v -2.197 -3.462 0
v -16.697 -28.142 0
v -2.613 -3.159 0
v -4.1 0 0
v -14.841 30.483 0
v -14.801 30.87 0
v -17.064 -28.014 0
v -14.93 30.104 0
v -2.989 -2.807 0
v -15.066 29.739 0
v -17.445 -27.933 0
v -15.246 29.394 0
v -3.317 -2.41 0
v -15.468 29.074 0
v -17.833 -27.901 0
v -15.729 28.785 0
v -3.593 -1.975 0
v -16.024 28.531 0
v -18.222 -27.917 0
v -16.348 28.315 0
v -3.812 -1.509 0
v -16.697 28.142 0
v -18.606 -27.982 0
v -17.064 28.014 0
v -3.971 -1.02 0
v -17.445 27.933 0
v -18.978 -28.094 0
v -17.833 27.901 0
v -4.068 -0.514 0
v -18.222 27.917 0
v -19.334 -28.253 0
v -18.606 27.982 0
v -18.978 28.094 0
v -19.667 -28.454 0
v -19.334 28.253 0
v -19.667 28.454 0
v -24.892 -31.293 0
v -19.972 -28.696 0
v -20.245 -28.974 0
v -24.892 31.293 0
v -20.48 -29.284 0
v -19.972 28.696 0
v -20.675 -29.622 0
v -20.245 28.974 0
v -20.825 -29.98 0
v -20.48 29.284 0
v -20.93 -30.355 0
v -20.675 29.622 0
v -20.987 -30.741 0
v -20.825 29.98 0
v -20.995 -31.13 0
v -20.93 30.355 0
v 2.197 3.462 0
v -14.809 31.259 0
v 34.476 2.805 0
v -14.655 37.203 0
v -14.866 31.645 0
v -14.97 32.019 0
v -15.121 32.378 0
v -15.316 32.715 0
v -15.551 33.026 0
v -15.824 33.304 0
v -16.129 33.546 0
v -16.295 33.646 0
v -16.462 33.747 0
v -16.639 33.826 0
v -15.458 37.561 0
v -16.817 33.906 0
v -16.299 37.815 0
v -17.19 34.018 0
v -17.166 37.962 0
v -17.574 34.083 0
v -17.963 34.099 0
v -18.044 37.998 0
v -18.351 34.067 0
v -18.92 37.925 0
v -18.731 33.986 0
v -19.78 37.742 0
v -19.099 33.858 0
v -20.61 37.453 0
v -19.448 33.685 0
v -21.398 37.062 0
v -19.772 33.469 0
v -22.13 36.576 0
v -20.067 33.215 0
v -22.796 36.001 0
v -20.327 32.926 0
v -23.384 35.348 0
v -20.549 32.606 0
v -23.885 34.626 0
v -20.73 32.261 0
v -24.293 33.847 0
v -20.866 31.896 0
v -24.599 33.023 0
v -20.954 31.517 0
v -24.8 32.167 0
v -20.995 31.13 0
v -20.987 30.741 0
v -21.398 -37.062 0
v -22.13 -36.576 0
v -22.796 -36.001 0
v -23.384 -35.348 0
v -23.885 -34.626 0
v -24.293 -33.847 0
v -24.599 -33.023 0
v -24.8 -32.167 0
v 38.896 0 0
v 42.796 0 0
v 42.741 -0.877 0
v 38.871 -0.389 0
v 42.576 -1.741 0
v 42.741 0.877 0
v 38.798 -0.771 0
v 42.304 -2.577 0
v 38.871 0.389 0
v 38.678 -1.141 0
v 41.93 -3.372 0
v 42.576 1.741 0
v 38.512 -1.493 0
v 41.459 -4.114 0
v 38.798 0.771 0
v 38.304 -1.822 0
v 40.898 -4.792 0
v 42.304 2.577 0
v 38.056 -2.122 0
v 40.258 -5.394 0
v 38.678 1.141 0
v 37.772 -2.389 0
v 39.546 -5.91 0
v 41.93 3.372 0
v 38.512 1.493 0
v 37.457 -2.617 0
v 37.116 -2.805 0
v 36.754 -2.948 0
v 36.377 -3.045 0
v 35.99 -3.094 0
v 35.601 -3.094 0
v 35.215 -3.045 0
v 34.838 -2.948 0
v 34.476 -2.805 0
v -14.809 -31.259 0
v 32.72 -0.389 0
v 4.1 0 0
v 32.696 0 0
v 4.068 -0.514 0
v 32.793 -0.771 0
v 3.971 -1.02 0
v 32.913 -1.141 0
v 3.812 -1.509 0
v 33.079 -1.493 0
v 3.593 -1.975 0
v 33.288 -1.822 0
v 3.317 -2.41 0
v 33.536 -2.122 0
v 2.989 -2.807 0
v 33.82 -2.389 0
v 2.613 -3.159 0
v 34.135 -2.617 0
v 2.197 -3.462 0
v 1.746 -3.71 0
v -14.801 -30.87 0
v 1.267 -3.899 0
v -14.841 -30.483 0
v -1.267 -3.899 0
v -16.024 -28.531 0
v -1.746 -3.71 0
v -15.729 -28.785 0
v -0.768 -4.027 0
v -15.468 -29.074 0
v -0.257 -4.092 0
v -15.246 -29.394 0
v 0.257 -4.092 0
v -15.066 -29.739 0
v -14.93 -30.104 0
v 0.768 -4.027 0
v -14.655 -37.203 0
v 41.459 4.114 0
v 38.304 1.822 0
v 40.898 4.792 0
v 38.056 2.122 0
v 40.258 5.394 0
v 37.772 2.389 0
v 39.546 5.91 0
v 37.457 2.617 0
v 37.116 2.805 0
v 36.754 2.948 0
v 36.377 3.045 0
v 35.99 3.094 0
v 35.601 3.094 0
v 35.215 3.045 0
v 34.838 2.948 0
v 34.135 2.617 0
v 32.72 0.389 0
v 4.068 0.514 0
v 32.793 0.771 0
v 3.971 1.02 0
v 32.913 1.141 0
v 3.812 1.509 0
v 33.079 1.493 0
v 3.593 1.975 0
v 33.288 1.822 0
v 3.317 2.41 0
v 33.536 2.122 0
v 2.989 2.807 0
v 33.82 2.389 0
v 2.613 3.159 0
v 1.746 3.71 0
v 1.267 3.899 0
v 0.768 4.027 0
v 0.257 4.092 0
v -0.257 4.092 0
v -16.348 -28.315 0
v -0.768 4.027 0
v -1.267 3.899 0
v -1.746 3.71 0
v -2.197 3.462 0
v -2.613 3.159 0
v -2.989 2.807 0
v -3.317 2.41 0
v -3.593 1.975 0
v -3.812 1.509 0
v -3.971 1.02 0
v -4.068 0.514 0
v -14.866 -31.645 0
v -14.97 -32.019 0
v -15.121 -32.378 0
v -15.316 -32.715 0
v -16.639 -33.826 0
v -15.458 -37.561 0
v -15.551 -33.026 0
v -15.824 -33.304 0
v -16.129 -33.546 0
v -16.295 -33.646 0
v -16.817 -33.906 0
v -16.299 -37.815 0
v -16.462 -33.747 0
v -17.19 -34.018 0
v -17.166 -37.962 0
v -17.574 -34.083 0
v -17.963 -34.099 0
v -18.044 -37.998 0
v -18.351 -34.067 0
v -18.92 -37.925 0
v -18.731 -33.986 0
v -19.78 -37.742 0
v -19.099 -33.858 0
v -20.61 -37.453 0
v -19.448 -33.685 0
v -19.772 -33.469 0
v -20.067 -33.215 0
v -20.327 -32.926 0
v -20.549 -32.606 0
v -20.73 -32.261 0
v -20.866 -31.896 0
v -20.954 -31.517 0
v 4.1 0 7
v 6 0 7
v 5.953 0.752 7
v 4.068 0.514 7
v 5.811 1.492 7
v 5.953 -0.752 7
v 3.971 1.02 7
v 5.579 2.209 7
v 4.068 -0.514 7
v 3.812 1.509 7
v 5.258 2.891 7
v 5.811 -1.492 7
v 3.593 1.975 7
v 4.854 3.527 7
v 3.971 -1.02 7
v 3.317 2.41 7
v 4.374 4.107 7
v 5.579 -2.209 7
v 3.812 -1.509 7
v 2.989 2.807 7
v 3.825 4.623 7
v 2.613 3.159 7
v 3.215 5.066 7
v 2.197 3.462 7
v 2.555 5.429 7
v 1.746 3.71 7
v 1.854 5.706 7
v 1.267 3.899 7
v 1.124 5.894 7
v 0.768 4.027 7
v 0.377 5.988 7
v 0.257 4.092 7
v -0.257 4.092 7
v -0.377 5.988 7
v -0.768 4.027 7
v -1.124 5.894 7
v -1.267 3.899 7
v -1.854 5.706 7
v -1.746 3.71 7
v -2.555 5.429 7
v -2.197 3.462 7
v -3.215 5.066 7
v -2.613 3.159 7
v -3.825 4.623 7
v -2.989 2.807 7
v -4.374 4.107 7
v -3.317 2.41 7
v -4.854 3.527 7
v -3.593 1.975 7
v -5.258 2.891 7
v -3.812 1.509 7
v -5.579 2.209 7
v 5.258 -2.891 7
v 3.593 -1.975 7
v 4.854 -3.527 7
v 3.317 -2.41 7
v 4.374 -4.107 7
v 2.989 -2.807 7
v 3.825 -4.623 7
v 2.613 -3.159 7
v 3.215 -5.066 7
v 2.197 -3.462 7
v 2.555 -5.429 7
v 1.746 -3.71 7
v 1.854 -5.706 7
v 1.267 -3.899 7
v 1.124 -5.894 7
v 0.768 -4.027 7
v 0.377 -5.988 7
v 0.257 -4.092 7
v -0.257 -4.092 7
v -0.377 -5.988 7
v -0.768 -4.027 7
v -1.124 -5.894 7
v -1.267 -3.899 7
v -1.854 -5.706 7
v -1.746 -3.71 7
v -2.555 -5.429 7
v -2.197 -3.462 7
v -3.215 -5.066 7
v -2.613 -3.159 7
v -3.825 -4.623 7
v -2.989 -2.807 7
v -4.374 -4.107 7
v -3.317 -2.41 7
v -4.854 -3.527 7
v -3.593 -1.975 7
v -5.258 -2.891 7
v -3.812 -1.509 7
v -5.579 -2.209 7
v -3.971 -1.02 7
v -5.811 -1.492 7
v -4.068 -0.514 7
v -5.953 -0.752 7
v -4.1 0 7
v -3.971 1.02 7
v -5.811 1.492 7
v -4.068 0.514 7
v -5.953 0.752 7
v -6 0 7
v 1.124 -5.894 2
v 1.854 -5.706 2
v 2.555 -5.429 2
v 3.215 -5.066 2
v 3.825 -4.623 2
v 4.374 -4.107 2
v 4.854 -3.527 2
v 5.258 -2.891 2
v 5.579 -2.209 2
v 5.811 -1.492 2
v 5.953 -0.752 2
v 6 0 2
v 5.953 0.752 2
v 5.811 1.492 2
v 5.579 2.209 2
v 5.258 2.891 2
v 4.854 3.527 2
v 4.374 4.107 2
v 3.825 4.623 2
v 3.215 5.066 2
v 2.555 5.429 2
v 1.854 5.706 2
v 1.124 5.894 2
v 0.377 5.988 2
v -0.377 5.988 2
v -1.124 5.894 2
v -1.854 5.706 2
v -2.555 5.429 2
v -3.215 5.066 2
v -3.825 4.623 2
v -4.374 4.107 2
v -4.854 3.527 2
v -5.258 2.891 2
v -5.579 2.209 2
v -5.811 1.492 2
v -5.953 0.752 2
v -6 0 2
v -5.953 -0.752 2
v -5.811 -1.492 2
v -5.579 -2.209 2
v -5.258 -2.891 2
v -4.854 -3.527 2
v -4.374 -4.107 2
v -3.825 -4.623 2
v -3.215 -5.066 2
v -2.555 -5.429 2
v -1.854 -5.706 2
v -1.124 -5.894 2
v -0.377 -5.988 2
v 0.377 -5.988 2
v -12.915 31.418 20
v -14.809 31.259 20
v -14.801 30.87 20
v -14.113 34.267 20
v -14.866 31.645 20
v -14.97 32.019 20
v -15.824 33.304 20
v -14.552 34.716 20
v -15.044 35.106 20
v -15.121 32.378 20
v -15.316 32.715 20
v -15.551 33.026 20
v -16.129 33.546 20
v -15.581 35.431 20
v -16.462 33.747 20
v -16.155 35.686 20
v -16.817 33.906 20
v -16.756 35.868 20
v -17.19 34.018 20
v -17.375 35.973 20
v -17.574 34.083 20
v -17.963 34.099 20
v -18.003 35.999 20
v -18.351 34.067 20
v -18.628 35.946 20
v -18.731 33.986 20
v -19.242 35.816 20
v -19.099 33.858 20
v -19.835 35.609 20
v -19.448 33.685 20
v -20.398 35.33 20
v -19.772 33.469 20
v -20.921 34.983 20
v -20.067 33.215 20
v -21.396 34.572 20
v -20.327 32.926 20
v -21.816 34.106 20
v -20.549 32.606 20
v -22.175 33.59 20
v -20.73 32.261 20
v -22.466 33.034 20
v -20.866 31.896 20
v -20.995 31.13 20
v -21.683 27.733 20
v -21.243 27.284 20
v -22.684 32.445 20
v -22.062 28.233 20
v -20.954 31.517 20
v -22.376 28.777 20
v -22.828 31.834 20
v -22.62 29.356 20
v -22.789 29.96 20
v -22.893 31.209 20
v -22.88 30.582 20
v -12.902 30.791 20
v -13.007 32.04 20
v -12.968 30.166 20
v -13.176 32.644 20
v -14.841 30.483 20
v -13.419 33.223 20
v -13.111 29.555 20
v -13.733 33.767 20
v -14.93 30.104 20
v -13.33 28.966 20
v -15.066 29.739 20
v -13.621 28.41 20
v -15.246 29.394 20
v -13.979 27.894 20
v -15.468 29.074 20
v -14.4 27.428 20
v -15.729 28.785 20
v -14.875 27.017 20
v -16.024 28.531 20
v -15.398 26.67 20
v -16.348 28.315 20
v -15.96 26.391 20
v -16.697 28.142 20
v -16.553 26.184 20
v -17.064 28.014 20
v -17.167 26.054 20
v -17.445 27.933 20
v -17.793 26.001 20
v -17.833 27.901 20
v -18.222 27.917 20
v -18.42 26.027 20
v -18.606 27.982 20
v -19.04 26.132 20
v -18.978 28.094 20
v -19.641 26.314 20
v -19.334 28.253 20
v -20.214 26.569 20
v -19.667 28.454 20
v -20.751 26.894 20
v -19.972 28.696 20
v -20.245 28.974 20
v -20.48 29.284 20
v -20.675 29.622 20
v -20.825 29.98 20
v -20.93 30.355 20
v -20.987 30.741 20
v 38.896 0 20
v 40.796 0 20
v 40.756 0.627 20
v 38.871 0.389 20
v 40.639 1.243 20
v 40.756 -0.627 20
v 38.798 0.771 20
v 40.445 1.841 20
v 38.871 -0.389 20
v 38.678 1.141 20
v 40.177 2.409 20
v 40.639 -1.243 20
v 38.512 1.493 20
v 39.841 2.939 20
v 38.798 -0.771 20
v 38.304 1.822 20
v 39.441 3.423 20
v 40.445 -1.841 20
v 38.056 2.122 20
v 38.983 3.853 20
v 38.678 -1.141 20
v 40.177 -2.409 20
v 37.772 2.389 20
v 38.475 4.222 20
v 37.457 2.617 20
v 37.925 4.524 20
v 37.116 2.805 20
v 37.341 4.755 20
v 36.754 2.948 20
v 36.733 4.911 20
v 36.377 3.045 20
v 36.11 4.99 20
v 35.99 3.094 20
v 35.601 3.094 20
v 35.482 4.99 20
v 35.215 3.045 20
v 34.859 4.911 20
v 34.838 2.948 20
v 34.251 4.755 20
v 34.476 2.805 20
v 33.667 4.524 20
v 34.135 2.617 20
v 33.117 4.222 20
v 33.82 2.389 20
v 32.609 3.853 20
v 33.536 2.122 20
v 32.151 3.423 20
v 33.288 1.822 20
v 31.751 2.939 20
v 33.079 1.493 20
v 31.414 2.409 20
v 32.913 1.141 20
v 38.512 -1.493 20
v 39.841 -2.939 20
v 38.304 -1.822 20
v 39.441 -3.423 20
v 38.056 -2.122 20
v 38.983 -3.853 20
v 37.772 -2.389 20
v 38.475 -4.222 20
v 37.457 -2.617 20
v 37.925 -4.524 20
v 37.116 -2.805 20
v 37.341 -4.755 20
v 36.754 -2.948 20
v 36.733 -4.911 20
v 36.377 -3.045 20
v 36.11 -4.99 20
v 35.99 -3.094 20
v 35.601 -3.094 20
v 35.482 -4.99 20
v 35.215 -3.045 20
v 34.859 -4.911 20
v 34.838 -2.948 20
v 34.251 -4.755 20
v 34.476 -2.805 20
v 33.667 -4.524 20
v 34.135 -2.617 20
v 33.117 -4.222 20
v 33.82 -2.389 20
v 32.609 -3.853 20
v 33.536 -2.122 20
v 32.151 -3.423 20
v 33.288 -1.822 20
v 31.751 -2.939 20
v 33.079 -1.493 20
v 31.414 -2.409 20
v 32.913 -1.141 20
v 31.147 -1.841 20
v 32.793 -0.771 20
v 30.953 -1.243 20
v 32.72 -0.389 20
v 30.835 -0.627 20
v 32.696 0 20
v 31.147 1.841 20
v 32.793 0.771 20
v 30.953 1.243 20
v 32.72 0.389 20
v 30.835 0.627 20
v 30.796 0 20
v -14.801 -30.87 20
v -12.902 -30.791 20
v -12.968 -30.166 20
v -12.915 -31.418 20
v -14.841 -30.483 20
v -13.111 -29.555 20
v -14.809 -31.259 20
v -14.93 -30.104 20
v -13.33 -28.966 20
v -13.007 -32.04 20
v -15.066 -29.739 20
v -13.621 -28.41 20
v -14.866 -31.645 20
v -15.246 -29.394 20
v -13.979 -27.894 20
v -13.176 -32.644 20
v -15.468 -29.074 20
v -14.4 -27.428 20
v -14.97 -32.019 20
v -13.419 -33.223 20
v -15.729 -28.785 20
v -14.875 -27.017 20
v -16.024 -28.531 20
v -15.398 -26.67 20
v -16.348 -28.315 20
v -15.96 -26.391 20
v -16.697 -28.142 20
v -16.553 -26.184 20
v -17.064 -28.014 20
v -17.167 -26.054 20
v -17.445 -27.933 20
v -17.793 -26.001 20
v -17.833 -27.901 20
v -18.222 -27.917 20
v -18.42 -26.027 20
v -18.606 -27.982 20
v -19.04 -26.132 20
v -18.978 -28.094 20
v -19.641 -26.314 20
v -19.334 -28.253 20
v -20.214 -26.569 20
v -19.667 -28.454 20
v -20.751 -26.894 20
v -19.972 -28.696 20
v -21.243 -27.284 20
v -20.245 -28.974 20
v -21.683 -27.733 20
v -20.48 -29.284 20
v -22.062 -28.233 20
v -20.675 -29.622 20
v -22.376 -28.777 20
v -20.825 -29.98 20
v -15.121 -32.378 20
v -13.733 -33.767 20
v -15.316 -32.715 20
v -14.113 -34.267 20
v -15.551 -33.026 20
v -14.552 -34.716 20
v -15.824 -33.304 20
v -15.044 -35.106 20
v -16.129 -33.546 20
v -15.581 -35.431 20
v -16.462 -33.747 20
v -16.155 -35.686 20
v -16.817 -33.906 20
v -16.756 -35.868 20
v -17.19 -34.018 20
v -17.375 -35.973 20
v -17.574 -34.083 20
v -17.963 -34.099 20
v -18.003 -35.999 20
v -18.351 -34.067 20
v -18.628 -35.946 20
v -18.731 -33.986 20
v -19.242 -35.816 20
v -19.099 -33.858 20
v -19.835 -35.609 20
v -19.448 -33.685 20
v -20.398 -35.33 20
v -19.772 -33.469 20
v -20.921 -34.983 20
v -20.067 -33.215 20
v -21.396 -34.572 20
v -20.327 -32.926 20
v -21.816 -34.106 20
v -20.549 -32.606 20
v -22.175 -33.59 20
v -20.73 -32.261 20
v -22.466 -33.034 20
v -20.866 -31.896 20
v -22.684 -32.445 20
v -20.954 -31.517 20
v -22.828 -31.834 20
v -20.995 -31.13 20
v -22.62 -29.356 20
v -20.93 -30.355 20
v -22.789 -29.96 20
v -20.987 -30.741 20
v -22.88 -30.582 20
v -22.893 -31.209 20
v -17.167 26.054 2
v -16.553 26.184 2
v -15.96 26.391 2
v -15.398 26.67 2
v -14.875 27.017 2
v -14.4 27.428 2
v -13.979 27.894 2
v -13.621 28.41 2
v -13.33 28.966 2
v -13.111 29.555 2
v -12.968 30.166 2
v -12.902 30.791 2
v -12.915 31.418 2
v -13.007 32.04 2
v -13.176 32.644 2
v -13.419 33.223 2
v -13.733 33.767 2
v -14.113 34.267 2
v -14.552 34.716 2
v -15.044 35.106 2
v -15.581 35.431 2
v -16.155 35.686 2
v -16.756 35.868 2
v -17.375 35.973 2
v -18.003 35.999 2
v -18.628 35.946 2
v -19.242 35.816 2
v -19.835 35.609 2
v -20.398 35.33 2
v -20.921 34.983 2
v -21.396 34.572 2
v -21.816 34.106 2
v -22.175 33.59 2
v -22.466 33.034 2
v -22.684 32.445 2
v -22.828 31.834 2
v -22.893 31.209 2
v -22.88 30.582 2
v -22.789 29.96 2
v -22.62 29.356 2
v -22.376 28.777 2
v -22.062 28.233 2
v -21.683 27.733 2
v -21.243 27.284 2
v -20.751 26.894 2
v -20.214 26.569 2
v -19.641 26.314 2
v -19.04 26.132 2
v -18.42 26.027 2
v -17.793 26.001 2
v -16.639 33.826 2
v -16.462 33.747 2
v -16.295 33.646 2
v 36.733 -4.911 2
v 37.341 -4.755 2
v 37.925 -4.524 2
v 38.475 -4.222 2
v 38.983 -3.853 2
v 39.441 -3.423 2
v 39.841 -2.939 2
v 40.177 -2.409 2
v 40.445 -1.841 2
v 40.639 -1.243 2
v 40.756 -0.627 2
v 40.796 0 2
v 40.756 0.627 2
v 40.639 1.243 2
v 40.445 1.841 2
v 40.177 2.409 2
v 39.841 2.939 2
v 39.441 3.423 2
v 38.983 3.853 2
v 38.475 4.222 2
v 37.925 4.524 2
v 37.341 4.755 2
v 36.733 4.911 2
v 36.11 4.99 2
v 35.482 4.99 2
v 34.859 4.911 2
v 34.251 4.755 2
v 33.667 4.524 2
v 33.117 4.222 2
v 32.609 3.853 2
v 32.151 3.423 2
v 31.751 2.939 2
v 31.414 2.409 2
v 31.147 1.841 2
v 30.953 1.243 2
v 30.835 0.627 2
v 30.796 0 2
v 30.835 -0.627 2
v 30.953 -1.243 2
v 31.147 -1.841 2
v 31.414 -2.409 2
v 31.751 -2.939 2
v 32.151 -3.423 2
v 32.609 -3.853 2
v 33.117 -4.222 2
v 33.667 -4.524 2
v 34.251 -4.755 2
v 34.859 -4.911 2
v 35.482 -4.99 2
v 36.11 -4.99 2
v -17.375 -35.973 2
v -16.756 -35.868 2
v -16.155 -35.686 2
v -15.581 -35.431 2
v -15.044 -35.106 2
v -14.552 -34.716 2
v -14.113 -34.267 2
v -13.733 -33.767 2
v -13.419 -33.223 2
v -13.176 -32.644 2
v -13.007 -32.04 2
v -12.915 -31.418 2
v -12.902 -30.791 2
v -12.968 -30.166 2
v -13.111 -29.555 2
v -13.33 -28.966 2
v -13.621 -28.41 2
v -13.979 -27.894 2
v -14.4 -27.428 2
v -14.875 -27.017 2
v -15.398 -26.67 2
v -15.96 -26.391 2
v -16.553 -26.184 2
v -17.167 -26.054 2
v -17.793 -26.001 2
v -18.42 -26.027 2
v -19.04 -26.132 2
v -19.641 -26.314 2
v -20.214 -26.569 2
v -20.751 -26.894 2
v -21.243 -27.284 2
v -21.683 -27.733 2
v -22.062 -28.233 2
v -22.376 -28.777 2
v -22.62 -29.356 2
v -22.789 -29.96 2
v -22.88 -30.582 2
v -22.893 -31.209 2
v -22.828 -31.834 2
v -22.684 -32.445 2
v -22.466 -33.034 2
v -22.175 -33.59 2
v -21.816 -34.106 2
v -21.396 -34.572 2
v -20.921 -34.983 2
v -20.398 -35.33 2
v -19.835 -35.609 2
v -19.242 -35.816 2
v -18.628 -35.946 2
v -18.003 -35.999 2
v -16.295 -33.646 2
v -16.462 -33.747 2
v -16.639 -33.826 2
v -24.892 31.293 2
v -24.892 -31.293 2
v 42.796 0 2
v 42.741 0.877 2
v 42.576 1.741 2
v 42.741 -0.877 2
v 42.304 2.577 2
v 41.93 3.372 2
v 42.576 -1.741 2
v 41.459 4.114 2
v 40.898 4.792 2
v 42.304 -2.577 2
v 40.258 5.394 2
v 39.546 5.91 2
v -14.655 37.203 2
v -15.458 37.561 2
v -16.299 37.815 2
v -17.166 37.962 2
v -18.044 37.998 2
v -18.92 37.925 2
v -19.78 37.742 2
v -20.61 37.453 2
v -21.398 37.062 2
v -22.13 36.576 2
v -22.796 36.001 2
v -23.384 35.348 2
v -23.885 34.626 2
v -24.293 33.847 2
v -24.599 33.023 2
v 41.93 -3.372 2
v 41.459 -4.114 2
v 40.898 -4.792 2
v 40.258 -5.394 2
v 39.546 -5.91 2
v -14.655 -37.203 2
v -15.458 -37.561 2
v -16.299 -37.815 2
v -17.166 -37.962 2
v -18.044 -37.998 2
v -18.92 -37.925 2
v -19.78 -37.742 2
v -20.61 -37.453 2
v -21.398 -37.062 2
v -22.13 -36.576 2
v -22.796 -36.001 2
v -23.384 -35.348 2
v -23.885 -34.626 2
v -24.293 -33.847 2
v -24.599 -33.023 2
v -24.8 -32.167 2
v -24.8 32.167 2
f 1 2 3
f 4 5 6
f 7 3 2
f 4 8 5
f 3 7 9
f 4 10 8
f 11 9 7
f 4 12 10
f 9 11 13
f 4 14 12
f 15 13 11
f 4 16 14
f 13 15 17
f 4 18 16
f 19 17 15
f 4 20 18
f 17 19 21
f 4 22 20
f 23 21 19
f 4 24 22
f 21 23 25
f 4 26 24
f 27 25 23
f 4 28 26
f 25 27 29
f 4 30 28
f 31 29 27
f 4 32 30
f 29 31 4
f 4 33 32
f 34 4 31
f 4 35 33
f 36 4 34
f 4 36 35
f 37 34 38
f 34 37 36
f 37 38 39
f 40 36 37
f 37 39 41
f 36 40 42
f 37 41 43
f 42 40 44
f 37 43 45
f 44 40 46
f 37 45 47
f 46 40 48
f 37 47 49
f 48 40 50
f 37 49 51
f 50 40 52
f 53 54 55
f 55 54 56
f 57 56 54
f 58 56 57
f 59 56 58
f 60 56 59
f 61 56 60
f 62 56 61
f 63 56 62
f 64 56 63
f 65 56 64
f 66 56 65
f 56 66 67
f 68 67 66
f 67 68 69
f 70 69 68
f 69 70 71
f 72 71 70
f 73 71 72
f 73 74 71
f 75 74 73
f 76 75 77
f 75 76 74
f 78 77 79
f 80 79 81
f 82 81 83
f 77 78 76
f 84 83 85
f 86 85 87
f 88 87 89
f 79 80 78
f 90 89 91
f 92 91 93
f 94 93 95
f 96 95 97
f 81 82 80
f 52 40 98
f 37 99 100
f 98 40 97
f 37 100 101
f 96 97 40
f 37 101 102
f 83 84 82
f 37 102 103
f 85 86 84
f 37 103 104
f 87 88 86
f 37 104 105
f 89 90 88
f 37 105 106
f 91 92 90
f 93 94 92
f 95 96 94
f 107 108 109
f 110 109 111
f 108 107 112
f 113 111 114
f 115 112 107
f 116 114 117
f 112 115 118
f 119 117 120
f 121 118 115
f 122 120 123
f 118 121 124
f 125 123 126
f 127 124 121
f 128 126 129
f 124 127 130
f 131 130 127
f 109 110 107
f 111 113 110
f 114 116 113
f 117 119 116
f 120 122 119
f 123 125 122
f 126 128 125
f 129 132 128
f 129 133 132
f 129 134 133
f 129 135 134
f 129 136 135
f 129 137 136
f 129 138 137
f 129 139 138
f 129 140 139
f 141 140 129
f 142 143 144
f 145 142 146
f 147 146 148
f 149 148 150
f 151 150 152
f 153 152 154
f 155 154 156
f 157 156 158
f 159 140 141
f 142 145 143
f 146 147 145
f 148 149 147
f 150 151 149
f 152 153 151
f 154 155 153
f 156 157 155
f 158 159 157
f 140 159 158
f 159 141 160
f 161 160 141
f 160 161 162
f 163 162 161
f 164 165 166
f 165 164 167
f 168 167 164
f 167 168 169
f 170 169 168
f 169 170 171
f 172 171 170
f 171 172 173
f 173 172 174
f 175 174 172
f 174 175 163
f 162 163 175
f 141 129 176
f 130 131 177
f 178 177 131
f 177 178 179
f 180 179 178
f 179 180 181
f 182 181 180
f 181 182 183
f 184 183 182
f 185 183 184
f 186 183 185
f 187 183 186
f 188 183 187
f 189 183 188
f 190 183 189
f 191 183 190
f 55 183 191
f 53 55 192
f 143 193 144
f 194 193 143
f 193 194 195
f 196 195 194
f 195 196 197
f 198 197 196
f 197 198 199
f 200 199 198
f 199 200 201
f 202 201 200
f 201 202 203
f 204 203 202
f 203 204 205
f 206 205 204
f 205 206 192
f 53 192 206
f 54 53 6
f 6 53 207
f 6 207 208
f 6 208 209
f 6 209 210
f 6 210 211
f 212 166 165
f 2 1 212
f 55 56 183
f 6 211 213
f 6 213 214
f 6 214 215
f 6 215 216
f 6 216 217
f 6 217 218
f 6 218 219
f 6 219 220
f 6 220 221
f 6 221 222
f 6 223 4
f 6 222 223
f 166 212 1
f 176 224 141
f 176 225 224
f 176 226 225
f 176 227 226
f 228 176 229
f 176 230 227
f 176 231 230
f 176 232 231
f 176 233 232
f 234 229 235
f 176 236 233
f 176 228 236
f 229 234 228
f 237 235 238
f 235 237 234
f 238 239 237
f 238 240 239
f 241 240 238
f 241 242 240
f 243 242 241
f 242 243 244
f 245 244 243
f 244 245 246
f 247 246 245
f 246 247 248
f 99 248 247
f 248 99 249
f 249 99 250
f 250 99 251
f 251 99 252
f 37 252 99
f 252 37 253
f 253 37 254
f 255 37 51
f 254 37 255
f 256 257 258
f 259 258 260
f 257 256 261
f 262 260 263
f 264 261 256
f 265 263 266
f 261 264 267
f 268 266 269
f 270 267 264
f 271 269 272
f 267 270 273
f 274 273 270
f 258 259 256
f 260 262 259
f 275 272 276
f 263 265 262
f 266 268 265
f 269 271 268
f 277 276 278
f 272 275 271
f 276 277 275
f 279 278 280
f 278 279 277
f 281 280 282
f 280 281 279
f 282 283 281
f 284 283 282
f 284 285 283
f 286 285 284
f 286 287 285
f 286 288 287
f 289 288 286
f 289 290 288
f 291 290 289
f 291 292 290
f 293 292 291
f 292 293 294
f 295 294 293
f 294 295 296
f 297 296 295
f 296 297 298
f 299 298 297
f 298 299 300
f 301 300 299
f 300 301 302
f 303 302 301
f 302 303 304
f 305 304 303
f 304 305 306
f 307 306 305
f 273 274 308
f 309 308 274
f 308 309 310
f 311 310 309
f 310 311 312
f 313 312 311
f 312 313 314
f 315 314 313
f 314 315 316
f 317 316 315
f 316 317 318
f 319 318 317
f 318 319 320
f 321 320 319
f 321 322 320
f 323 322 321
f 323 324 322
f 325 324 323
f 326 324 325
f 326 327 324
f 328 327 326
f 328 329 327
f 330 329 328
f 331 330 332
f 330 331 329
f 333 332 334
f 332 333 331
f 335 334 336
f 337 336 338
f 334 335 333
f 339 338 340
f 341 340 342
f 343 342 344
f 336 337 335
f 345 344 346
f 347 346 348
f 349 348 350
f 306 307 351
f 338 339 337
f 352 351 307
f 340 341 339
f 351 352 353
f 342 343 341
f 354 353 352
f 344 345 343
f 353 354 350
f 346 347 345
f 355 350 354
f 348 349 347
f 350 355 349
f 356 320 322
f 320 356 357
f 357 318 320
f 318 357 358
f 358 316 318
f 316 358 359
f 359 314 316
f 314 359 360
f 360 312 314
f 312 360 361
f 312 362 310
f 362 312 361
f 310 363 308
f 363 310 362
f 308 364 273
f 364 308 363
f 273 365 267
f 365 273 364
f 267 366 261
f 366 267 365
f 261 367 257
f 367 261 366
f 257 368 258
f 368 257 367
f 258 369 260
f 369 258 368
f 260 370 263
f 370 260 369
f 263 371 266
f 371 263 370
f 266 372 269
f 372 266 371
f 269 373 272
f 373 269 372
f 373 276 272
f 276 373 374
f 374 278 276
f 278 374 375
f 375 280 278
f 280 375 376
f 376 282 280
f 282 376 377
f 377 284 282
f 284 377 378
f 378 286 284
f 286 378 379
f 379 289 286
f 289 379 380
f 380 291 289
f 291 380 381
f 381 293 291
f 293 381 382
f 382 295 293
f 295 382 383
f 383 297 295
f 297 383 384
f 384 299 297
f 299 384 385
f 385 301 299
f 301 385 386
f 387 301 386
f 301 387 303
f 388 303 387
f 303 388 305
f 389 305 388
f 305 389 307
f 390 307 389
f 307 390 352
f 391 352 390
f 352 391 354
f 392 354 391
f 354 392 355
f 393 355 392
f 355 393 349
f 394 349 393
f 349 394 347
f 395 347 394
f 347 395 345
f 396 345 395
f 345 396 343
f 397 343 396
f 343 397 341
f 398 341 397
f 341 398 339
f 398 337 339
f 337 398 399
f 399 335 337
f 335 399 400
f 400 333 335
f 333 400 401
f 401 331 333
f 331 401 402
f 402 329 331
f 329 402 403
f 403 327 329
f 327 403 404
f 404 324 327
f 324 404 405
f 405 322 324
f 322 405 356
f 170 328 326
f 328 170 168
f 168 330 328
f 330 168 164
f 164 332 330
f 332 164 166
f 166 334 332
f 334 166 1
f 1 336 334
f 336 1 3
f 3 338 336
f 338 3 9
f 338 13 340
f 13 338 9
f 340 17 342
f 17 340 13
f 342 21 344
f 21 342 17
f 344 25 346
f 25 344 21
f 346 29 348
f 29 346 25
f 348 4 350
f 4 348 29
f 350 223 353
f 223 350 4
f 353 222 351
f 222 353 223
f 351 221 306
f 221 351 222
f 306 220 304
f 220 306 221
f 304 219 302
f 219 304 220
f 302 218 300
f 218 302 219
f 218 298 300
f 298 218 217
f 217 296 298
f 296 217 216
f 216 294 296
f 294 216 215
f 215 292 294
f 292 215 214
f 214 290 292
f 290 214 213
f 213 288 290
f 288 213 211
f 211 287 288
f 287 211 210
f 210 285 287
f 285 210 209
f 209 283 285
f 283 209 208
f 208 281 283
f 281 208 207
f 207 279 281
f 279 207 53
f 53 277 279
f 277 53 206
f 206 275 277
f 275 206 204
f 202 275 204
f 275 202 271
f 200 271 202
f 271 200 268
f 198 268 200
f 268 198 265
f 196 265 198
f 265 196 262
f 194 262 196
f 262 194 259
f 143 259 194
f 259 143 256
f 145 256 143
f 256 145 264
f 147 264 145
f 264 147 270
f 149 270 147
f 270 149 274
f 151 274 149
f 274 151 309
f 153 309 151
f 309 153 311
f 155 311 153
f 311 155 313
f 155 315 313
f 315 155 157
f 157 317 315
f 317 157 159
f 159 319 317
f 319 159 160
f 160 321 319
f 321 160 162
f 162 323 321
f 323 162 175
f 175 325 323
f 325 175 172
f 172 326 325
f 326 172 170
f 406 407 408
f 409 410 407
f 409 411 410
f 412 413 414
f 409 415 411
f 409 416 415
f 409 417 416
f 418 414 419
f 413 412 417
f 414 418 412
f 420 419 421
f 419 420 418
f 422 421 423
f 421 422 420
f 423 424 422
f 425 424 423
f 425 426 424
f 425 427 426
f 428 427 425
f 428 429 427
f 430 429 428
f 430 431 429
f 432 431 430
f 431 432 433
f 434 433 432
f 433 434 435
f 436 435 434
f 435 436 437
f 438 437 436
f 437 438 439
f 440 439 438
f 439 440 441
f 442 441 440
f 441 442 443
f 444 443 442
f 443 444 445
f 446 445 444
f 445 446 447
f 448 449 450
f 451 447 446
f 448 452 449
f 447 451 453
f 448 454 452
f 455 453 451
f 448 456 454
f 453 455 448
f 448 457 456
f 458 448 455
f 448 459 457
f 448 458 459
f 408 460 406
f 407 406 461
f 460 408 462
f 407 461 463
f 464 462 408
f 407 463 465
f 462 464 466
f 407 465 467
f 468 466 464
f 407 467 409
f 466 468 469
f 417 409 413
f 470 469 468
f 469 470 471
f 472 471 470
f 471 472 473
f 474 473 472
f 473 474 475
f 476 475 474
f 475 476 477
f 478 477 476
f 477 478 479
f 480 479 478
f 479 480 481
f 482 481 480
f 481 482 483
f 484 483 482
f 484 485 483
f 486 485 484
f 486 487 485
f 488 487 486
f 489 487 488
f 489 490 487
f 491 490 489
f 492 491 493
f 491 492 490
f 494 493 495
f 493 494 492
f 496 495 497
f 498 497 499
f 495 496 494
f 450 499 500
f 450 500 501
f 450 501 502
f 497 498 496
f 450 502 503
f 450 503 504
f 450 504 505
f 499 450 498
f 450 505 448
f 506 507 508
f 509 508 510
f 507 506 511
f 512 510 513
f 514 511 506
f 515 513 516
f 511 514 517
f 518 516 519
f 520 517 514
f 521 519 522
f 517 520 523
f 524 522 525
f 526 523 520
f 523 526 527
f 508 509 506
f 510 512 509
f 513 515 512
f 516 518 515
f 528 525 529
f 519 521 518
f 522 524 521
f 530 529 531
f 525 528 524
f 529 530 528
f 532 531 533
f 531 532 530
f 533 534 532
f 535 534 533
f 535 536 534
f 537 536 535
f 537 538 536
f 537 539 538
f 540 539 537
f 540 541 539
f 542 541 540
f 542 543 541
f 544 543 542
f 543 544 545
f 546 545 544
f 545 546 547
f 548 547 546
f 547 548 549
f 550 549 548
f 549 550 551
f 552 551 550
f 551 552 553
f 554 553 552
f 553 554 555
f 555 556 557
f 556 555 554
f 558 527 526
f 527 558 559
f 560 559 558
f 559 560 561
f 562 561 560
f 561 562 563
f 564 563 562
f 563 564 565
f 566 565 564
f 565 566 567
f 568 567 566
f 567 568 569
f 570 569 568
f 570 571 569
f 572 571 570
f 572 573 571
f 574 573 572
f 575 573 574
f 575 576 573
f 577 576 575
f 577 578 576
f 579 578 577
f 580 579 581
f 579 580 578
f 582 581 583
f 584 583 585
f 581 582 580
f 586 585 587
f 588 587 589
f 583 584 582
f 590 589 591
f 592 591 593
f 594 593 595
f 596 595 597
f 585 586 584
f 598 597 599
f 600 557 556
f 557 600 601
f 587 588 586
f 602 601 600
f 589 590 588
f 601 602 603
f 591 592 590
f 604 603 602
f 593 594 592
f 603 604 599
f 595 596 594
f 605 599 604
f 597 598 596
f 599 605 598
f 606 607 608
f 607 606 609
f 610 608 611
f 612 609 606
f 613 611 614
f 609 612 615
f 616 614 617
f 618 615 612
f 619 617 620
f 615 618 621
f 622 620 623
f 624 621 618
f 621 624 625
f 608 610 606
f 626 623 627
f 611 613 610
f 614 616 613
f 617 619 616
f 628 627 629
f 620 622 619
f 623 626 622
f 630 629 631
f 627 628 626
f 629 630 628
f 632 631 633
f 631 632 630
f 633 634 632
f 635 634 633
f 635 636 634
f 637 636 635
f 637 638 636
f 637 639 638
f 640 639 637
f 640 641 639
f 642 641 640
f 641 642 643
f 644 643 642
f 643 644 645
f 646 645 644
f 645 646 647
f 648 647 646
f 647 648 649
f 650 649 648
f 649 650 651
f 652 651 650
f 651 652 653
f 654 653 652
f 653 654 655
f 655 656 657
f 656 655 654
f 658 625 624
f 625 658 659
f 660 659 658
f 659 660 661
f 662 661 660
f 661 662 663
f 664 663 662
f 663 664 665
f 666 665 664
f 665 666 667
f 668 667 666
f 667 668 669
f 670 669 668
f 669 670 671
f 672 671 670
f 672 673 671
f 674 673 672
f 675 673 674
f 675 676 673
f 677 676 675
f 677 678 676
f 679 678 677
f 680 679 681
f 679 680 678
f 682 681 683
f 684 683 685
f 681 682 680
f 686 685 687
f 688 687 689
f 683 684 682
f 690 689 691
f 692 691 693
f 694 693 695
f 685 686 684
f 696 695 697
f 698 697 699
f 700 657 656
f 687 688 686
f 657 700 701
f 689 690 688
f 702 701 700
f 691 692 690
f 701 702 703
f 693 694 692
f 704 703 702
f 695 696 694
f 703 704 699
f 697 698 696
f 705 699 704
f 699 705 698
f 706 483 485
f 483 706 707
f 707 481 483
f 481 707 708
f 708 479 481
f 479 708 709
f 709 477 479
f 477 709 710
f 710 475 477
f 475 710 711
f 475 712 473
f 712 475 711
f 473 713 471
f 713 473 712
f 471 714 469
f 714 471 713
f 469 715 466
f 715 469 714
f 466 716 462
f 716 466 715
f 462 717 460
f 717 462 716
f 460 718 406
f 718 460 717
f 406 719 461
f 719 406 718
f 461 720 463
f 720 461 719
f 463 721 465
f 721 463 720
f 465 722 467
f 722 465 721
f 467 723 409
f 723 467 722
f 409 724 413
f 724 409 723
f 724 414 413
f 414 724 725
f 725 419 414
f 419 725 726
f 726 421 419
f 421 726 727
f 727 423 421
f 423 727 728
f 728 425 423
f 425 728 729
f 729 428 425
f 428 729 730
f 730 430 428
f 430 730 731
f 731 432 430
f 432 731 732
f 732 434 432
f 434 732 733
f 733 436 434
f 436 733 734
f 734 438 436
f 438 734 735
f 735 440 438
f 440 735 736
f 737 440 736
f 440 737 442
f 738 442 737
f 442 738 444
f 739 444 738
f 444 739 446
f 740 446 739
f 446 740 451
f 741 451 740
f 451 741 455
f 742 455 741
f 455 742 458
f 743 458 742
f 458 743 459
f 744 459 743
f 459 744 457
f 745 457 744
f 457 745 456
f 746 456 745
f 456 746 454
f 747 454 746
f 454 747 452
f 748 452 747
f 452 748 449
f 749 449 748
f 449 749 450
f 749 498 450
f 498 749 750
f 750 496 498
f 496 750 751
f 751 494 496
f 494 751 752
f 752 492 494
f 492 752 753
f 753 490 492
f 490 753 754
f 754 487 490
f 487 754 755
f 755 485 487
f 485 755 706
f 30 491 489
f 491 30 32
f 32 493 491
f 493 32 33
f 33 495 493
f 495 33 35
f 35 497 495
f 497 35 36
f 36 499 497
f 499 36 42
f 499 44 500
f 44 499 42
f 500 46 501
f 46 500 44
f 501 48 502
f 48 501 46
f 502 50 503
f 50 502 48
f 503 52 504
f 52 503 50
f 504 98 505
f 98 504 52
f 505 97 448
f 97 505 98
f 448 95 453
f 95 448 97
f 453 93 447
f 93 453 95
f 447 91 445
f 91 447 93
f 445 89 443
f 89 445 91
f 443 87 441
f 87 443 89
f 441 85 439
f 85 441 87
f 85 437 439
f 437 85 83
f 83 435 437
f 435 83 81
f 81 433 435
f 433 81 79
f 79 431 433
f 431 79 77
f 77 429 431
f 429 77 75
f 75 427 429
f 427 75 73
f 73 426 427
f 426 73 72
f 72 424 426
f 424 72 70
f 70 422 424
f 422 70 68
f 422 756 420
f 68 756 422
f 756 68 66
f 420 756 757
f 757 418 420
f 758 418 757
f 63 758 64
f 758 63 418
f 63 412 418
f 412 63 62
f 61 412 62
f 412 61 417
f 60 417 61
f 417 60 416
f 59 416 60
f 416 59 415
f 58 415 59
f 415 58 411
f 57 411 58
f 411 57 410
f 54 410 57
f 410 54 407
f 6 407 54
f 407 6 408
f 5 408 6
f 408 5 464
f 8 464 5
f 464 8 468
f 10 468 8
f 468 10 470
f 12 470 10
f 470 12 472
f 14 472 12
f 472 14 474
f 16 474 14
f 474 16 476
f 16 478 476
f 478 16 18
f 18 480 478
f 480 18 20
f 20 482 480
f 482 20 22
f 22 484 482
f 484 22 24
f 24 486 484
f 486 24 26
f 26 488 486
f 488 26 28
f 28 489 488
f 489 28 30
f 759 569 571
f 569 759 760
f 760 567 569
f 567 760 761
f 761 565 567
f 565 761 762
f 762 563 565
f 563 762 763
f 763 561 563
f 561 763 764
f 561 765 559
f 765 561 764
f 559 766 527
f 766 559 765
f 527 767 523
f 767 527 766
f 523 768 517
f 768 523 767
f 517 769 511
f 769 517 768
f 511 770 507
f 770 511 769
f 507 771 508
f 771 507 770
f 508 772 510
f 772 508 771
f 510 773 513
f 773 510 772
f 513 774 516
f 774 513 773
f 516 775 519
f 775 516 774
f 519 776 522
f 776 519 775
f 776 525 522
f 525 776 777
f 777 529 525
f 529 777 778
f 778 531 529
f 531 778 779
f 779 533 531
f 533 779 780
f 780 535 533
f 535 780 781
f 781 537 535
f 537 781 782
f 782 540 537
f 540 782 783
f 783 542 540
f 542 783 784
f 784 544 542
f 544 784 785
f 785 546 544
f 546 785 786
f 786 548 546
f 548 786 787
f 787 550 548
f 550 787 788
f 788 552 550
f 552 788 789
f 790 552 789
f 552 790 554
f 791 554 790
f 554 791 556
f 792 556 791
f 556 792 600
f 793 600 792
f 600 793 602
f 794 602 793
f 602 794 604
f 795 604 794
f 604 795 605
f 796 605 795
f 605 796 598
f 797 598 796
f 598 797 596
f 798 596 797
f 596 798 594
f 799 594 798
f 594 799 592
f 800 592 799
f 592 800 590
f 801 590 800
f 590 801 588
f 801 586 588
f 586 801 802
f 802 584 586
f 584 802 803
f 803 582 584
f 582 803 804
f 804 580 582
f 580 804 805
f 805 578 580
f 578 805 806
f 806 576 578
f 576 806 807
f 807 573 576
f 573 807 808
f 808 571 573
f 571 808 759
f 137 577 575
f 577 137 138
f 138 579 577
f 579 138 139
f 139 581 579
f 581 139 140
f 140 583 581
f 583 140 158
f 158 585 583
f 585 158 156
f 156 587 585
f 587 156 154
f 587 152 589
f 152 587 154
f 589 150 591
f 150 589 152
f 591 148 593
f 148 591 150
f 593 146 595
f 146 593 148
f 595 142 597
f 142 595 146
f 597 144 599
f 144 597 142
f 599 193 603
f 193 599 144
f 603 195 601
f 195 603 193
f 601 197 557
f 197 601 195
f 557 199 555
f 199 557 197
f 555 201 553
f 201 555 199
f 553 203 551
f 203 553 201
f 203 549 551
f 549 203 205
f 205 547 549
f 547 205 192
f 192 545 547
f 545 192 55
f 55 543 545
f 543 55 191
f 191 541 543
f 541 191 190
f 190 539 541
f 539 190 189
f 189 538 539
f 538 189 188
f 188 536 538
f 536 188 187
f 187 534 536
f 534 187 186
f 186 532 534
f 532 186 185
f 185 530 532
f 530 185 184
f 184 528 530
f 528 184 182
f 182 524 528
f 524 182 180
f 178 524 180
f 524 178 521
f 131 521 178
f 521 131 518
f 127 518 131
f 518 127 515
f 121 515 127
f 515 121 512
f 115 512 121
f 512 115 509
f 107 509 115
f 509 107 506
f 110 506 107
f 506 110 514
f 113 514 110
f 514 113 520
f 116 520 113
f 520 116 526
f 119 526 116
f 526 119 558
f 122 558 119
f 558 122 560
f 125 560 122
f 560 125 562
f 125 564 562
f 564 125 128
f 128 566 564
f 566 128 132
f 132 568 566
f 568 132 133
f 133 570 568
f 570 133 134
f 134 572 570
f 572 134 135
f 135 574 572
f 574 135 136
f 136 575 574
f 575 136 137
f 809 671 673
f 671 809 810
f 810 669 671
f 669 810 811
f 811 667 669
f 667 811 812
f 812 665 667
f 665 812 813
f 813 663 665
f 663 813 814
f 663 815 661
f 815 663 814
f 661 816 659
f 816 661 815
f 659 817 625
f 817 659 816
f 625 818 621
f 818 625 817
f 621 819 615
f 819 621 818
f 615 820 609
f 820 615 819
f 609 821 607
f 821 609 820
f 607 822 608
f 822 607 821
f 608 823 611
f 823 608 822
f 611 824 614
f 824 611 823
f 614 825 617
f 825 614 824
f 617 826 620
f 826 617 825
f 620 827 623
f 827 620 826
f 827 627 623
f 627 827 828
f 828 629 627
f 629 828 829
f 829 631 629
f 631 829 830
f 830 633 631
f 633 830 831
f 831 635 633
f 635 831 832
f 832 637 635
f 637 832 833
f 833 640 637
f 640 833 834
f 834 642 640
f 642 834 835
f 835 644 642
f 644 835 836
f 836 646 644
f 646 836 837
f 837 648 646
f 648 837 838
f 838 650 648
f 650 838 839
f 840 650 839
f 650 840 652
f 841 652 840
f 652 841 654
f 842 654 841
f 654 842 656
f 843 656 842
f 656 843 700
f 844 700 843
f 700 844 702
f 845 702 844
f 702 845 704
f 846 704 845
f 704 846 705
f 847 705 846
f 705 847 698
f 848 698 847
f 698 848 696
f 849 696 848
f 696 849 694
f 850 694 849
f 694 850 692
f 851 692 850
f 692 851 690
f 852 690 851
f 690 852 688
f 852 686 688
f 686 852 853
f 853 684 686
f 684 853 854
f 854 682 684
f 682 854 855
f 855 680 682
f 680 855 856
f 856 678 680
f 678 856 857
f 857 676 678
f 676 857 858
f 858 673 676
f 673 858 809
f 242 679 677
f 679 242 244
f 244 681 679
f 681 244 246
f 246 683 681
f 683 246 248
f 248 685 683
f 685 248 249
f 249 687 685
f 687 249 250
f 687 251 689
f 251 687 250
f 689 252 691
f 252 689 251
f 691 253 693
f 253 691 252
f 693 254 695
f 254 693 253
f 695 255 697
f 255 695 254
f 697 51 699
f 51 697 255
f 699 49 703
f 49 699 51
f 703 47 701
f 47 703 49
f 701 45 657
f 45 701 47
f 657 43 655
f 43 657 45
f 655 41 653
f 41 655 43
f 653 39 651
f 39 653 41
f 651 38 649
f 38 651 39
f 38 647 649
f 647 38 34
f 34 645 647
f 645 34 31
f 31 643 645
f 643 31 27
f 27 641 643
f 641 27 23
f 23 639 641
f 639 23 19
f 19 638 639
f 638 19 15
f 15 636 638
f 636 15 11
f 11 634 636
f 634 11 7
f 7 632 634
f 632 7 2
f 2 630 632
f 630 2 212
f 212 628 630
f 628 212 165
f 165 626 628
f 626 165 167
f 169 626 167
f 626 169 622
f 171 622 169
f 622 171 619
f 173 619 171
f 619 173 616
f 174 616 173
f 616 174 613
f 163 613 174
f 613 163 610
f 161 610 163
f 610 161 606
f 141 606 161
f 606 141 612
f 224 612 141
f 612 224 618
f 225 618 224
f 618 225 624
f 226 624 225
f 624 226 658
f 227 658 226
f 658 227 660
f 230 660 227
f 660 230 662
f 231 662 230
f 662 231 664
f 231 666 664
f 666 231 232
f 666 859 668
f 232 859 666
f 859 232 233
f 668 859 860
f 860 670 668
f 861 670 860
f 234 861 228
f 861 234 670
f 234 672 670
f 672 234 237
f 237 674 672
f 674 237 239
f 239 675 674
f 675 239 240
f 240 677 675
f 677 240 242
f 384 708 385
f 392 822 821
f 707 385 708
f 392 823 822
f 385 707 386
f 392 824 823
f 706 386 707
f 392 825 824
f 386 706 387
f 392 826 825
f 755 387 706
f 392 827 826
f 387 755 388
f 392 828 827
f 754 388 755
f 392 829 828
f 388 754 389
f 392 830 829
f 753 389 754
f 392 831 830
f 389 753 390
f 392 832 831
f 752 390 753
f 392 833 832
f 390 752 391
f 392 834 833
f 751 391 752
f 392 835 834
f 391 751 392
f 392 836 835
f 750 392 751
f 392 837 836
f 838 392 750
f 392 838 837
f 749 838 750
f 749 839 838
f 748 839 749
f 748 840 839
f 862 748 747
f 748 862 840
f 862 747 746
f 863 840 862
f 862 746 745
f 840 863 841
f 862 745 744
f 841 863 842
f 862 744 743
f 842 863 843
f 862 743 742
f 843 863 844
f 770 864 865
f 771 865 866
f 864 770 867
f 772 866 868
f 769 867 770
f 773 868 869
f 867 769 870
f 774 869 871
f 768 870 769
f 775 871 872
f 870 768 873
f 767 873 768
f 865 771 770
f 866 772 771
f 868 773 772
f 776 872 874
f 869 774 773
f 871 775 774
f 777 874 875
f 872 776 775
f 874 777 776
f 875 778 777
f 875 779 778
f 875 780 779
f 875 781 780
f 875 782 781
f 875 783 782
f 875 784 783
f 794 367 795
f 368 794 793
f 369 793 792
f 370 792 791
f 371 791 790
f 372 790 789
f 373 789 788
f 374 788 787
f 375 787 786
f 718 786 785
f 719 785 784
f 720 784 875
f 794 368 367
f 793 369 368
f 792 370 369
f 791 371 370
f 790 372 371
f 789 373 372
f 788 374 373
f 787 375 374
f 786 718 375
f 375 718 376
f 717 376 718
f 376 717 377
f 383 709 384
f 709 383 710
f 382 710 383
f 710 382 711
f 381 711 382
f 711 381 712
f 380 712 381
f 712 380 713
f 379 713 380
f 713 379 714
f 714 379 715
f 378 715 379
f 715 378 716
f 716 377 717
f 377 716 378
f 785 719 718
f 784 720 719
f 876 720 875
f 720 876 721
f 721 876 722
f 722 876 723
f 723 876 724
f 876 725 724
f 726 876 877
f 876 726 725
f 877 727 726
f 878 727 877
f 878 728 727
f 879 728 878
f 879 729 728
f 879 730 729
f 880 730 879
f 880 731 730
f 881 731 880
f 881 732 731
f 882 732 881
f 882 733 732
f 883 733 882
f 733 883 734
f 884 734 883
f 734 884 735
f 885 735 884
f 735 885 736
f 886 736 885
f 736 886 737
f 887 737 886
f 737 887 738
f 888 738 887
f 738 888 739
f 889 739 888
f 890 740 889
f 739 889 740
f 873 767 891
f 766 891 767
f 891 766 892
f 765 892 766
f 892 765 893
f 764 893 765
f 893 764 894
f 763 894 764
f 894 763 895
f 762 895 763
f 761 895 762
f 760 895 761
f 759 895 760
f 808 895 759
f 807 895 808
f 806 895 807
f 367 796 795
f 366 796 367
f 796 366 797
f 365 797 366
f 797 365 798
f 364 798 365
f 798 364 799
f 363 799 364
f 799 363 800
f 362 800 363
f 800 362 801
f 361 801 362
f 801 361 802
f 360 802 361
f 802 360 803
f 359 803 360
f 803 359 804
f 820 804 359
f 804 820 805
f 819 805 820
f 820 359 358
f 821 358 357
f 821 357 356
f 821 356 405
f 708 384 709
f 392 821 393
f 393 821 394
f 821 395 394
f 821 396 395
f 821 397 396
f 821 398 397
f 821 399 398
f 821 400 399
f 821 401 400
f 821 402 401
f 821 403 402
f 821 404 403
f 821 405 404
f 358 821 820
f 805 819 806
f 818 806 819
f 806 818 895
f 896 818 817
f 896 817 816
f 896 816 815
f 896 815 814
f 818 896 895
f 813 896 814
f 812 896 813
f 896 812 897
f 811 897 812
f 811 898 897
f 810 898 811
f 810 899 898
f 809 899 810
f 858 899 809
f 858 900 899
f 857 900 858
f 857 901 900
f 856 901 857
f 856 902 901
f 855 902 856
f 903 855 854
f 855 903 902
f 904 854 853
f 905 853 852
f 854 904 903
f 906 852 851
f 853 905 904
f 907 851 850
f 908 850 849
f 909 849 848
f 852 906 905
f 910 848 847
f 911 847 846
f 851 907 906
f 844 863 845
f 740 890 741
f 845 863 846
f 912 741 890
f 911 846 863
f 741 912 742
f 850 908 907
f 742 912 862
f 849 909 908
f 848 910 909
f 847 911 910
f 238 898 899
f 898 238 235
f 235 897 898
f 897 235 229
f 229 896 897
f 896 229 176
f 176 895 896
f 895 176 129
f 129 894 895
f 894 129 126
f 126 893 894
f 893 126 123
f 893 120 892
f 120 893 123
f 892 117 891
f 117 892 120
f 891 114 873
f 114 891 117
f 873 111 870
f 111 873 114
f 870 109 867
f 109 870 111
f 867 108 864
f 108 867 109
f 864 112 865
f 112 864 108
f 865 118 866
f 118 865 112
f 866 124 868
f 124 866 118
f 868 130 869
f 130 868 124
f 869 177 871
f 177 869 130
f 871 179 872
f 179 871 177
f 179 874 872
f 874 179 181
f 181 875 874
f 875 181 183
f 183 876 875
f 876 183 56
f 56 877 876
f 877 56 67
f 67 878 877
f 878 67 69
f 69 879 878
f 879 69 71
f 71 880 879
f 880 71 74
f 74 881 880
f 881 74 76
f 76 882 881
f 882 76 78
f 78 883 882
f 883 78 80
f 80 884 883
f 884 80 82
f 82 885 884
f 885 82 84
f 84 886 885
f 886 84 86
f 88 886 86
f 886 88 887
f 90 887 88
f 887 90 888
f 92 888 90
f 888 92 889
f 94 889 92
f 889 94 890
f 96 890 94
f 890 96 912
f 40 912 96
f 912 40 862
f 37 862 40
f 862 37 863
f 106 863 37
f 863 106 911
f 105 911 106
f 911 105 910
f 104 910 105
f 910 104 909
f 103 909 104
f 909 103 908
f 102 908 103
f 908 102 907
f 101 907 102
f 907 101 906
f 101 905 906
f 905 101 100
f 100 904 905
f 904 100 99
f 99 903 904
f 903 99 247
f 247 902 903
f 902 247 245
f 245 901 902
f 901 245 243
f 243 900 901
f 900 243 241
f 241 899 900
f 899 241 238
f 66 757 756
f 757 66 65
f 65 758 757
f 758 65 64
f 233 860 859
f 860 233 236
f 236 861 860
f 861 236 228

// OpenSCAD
$fn=50;
minWallThck=2;
sideLngth=62;
outerDrill=6;
outerHght=20;
centerDrill=8;
centerHght=7;
spcng=0.1;

ru=sideLngth/sqrt(3);

//center
linear_extrude(centerHght) difference(){
  circle(d=centerDrill+minWallThck*2);
  circle(d=centerDrill+spcng*2);
}

linear_extrude(outerHght)
  for (ir=[0:120:240])
    rotate(ir) translate([ru,0]) difference() {
      circle(d=outerDrill+minWallThck*2);
      circle(d=outerDrill+spcng*2);
    }
    
//base
linear_extrude(minWallThck) difference(){
    hull() for (ir=[0:120:240])
      rotate(ir) translate([ru,0]) 
        circle(d=outerDrill+minWallThck*4);
  
  for (ir=[0:120:240])
    rotate(ir) translate([ru,0]) 
      circle(d=outerDrill+spcng*2);
  circle(d=centerDrill+spcng*2);
}
